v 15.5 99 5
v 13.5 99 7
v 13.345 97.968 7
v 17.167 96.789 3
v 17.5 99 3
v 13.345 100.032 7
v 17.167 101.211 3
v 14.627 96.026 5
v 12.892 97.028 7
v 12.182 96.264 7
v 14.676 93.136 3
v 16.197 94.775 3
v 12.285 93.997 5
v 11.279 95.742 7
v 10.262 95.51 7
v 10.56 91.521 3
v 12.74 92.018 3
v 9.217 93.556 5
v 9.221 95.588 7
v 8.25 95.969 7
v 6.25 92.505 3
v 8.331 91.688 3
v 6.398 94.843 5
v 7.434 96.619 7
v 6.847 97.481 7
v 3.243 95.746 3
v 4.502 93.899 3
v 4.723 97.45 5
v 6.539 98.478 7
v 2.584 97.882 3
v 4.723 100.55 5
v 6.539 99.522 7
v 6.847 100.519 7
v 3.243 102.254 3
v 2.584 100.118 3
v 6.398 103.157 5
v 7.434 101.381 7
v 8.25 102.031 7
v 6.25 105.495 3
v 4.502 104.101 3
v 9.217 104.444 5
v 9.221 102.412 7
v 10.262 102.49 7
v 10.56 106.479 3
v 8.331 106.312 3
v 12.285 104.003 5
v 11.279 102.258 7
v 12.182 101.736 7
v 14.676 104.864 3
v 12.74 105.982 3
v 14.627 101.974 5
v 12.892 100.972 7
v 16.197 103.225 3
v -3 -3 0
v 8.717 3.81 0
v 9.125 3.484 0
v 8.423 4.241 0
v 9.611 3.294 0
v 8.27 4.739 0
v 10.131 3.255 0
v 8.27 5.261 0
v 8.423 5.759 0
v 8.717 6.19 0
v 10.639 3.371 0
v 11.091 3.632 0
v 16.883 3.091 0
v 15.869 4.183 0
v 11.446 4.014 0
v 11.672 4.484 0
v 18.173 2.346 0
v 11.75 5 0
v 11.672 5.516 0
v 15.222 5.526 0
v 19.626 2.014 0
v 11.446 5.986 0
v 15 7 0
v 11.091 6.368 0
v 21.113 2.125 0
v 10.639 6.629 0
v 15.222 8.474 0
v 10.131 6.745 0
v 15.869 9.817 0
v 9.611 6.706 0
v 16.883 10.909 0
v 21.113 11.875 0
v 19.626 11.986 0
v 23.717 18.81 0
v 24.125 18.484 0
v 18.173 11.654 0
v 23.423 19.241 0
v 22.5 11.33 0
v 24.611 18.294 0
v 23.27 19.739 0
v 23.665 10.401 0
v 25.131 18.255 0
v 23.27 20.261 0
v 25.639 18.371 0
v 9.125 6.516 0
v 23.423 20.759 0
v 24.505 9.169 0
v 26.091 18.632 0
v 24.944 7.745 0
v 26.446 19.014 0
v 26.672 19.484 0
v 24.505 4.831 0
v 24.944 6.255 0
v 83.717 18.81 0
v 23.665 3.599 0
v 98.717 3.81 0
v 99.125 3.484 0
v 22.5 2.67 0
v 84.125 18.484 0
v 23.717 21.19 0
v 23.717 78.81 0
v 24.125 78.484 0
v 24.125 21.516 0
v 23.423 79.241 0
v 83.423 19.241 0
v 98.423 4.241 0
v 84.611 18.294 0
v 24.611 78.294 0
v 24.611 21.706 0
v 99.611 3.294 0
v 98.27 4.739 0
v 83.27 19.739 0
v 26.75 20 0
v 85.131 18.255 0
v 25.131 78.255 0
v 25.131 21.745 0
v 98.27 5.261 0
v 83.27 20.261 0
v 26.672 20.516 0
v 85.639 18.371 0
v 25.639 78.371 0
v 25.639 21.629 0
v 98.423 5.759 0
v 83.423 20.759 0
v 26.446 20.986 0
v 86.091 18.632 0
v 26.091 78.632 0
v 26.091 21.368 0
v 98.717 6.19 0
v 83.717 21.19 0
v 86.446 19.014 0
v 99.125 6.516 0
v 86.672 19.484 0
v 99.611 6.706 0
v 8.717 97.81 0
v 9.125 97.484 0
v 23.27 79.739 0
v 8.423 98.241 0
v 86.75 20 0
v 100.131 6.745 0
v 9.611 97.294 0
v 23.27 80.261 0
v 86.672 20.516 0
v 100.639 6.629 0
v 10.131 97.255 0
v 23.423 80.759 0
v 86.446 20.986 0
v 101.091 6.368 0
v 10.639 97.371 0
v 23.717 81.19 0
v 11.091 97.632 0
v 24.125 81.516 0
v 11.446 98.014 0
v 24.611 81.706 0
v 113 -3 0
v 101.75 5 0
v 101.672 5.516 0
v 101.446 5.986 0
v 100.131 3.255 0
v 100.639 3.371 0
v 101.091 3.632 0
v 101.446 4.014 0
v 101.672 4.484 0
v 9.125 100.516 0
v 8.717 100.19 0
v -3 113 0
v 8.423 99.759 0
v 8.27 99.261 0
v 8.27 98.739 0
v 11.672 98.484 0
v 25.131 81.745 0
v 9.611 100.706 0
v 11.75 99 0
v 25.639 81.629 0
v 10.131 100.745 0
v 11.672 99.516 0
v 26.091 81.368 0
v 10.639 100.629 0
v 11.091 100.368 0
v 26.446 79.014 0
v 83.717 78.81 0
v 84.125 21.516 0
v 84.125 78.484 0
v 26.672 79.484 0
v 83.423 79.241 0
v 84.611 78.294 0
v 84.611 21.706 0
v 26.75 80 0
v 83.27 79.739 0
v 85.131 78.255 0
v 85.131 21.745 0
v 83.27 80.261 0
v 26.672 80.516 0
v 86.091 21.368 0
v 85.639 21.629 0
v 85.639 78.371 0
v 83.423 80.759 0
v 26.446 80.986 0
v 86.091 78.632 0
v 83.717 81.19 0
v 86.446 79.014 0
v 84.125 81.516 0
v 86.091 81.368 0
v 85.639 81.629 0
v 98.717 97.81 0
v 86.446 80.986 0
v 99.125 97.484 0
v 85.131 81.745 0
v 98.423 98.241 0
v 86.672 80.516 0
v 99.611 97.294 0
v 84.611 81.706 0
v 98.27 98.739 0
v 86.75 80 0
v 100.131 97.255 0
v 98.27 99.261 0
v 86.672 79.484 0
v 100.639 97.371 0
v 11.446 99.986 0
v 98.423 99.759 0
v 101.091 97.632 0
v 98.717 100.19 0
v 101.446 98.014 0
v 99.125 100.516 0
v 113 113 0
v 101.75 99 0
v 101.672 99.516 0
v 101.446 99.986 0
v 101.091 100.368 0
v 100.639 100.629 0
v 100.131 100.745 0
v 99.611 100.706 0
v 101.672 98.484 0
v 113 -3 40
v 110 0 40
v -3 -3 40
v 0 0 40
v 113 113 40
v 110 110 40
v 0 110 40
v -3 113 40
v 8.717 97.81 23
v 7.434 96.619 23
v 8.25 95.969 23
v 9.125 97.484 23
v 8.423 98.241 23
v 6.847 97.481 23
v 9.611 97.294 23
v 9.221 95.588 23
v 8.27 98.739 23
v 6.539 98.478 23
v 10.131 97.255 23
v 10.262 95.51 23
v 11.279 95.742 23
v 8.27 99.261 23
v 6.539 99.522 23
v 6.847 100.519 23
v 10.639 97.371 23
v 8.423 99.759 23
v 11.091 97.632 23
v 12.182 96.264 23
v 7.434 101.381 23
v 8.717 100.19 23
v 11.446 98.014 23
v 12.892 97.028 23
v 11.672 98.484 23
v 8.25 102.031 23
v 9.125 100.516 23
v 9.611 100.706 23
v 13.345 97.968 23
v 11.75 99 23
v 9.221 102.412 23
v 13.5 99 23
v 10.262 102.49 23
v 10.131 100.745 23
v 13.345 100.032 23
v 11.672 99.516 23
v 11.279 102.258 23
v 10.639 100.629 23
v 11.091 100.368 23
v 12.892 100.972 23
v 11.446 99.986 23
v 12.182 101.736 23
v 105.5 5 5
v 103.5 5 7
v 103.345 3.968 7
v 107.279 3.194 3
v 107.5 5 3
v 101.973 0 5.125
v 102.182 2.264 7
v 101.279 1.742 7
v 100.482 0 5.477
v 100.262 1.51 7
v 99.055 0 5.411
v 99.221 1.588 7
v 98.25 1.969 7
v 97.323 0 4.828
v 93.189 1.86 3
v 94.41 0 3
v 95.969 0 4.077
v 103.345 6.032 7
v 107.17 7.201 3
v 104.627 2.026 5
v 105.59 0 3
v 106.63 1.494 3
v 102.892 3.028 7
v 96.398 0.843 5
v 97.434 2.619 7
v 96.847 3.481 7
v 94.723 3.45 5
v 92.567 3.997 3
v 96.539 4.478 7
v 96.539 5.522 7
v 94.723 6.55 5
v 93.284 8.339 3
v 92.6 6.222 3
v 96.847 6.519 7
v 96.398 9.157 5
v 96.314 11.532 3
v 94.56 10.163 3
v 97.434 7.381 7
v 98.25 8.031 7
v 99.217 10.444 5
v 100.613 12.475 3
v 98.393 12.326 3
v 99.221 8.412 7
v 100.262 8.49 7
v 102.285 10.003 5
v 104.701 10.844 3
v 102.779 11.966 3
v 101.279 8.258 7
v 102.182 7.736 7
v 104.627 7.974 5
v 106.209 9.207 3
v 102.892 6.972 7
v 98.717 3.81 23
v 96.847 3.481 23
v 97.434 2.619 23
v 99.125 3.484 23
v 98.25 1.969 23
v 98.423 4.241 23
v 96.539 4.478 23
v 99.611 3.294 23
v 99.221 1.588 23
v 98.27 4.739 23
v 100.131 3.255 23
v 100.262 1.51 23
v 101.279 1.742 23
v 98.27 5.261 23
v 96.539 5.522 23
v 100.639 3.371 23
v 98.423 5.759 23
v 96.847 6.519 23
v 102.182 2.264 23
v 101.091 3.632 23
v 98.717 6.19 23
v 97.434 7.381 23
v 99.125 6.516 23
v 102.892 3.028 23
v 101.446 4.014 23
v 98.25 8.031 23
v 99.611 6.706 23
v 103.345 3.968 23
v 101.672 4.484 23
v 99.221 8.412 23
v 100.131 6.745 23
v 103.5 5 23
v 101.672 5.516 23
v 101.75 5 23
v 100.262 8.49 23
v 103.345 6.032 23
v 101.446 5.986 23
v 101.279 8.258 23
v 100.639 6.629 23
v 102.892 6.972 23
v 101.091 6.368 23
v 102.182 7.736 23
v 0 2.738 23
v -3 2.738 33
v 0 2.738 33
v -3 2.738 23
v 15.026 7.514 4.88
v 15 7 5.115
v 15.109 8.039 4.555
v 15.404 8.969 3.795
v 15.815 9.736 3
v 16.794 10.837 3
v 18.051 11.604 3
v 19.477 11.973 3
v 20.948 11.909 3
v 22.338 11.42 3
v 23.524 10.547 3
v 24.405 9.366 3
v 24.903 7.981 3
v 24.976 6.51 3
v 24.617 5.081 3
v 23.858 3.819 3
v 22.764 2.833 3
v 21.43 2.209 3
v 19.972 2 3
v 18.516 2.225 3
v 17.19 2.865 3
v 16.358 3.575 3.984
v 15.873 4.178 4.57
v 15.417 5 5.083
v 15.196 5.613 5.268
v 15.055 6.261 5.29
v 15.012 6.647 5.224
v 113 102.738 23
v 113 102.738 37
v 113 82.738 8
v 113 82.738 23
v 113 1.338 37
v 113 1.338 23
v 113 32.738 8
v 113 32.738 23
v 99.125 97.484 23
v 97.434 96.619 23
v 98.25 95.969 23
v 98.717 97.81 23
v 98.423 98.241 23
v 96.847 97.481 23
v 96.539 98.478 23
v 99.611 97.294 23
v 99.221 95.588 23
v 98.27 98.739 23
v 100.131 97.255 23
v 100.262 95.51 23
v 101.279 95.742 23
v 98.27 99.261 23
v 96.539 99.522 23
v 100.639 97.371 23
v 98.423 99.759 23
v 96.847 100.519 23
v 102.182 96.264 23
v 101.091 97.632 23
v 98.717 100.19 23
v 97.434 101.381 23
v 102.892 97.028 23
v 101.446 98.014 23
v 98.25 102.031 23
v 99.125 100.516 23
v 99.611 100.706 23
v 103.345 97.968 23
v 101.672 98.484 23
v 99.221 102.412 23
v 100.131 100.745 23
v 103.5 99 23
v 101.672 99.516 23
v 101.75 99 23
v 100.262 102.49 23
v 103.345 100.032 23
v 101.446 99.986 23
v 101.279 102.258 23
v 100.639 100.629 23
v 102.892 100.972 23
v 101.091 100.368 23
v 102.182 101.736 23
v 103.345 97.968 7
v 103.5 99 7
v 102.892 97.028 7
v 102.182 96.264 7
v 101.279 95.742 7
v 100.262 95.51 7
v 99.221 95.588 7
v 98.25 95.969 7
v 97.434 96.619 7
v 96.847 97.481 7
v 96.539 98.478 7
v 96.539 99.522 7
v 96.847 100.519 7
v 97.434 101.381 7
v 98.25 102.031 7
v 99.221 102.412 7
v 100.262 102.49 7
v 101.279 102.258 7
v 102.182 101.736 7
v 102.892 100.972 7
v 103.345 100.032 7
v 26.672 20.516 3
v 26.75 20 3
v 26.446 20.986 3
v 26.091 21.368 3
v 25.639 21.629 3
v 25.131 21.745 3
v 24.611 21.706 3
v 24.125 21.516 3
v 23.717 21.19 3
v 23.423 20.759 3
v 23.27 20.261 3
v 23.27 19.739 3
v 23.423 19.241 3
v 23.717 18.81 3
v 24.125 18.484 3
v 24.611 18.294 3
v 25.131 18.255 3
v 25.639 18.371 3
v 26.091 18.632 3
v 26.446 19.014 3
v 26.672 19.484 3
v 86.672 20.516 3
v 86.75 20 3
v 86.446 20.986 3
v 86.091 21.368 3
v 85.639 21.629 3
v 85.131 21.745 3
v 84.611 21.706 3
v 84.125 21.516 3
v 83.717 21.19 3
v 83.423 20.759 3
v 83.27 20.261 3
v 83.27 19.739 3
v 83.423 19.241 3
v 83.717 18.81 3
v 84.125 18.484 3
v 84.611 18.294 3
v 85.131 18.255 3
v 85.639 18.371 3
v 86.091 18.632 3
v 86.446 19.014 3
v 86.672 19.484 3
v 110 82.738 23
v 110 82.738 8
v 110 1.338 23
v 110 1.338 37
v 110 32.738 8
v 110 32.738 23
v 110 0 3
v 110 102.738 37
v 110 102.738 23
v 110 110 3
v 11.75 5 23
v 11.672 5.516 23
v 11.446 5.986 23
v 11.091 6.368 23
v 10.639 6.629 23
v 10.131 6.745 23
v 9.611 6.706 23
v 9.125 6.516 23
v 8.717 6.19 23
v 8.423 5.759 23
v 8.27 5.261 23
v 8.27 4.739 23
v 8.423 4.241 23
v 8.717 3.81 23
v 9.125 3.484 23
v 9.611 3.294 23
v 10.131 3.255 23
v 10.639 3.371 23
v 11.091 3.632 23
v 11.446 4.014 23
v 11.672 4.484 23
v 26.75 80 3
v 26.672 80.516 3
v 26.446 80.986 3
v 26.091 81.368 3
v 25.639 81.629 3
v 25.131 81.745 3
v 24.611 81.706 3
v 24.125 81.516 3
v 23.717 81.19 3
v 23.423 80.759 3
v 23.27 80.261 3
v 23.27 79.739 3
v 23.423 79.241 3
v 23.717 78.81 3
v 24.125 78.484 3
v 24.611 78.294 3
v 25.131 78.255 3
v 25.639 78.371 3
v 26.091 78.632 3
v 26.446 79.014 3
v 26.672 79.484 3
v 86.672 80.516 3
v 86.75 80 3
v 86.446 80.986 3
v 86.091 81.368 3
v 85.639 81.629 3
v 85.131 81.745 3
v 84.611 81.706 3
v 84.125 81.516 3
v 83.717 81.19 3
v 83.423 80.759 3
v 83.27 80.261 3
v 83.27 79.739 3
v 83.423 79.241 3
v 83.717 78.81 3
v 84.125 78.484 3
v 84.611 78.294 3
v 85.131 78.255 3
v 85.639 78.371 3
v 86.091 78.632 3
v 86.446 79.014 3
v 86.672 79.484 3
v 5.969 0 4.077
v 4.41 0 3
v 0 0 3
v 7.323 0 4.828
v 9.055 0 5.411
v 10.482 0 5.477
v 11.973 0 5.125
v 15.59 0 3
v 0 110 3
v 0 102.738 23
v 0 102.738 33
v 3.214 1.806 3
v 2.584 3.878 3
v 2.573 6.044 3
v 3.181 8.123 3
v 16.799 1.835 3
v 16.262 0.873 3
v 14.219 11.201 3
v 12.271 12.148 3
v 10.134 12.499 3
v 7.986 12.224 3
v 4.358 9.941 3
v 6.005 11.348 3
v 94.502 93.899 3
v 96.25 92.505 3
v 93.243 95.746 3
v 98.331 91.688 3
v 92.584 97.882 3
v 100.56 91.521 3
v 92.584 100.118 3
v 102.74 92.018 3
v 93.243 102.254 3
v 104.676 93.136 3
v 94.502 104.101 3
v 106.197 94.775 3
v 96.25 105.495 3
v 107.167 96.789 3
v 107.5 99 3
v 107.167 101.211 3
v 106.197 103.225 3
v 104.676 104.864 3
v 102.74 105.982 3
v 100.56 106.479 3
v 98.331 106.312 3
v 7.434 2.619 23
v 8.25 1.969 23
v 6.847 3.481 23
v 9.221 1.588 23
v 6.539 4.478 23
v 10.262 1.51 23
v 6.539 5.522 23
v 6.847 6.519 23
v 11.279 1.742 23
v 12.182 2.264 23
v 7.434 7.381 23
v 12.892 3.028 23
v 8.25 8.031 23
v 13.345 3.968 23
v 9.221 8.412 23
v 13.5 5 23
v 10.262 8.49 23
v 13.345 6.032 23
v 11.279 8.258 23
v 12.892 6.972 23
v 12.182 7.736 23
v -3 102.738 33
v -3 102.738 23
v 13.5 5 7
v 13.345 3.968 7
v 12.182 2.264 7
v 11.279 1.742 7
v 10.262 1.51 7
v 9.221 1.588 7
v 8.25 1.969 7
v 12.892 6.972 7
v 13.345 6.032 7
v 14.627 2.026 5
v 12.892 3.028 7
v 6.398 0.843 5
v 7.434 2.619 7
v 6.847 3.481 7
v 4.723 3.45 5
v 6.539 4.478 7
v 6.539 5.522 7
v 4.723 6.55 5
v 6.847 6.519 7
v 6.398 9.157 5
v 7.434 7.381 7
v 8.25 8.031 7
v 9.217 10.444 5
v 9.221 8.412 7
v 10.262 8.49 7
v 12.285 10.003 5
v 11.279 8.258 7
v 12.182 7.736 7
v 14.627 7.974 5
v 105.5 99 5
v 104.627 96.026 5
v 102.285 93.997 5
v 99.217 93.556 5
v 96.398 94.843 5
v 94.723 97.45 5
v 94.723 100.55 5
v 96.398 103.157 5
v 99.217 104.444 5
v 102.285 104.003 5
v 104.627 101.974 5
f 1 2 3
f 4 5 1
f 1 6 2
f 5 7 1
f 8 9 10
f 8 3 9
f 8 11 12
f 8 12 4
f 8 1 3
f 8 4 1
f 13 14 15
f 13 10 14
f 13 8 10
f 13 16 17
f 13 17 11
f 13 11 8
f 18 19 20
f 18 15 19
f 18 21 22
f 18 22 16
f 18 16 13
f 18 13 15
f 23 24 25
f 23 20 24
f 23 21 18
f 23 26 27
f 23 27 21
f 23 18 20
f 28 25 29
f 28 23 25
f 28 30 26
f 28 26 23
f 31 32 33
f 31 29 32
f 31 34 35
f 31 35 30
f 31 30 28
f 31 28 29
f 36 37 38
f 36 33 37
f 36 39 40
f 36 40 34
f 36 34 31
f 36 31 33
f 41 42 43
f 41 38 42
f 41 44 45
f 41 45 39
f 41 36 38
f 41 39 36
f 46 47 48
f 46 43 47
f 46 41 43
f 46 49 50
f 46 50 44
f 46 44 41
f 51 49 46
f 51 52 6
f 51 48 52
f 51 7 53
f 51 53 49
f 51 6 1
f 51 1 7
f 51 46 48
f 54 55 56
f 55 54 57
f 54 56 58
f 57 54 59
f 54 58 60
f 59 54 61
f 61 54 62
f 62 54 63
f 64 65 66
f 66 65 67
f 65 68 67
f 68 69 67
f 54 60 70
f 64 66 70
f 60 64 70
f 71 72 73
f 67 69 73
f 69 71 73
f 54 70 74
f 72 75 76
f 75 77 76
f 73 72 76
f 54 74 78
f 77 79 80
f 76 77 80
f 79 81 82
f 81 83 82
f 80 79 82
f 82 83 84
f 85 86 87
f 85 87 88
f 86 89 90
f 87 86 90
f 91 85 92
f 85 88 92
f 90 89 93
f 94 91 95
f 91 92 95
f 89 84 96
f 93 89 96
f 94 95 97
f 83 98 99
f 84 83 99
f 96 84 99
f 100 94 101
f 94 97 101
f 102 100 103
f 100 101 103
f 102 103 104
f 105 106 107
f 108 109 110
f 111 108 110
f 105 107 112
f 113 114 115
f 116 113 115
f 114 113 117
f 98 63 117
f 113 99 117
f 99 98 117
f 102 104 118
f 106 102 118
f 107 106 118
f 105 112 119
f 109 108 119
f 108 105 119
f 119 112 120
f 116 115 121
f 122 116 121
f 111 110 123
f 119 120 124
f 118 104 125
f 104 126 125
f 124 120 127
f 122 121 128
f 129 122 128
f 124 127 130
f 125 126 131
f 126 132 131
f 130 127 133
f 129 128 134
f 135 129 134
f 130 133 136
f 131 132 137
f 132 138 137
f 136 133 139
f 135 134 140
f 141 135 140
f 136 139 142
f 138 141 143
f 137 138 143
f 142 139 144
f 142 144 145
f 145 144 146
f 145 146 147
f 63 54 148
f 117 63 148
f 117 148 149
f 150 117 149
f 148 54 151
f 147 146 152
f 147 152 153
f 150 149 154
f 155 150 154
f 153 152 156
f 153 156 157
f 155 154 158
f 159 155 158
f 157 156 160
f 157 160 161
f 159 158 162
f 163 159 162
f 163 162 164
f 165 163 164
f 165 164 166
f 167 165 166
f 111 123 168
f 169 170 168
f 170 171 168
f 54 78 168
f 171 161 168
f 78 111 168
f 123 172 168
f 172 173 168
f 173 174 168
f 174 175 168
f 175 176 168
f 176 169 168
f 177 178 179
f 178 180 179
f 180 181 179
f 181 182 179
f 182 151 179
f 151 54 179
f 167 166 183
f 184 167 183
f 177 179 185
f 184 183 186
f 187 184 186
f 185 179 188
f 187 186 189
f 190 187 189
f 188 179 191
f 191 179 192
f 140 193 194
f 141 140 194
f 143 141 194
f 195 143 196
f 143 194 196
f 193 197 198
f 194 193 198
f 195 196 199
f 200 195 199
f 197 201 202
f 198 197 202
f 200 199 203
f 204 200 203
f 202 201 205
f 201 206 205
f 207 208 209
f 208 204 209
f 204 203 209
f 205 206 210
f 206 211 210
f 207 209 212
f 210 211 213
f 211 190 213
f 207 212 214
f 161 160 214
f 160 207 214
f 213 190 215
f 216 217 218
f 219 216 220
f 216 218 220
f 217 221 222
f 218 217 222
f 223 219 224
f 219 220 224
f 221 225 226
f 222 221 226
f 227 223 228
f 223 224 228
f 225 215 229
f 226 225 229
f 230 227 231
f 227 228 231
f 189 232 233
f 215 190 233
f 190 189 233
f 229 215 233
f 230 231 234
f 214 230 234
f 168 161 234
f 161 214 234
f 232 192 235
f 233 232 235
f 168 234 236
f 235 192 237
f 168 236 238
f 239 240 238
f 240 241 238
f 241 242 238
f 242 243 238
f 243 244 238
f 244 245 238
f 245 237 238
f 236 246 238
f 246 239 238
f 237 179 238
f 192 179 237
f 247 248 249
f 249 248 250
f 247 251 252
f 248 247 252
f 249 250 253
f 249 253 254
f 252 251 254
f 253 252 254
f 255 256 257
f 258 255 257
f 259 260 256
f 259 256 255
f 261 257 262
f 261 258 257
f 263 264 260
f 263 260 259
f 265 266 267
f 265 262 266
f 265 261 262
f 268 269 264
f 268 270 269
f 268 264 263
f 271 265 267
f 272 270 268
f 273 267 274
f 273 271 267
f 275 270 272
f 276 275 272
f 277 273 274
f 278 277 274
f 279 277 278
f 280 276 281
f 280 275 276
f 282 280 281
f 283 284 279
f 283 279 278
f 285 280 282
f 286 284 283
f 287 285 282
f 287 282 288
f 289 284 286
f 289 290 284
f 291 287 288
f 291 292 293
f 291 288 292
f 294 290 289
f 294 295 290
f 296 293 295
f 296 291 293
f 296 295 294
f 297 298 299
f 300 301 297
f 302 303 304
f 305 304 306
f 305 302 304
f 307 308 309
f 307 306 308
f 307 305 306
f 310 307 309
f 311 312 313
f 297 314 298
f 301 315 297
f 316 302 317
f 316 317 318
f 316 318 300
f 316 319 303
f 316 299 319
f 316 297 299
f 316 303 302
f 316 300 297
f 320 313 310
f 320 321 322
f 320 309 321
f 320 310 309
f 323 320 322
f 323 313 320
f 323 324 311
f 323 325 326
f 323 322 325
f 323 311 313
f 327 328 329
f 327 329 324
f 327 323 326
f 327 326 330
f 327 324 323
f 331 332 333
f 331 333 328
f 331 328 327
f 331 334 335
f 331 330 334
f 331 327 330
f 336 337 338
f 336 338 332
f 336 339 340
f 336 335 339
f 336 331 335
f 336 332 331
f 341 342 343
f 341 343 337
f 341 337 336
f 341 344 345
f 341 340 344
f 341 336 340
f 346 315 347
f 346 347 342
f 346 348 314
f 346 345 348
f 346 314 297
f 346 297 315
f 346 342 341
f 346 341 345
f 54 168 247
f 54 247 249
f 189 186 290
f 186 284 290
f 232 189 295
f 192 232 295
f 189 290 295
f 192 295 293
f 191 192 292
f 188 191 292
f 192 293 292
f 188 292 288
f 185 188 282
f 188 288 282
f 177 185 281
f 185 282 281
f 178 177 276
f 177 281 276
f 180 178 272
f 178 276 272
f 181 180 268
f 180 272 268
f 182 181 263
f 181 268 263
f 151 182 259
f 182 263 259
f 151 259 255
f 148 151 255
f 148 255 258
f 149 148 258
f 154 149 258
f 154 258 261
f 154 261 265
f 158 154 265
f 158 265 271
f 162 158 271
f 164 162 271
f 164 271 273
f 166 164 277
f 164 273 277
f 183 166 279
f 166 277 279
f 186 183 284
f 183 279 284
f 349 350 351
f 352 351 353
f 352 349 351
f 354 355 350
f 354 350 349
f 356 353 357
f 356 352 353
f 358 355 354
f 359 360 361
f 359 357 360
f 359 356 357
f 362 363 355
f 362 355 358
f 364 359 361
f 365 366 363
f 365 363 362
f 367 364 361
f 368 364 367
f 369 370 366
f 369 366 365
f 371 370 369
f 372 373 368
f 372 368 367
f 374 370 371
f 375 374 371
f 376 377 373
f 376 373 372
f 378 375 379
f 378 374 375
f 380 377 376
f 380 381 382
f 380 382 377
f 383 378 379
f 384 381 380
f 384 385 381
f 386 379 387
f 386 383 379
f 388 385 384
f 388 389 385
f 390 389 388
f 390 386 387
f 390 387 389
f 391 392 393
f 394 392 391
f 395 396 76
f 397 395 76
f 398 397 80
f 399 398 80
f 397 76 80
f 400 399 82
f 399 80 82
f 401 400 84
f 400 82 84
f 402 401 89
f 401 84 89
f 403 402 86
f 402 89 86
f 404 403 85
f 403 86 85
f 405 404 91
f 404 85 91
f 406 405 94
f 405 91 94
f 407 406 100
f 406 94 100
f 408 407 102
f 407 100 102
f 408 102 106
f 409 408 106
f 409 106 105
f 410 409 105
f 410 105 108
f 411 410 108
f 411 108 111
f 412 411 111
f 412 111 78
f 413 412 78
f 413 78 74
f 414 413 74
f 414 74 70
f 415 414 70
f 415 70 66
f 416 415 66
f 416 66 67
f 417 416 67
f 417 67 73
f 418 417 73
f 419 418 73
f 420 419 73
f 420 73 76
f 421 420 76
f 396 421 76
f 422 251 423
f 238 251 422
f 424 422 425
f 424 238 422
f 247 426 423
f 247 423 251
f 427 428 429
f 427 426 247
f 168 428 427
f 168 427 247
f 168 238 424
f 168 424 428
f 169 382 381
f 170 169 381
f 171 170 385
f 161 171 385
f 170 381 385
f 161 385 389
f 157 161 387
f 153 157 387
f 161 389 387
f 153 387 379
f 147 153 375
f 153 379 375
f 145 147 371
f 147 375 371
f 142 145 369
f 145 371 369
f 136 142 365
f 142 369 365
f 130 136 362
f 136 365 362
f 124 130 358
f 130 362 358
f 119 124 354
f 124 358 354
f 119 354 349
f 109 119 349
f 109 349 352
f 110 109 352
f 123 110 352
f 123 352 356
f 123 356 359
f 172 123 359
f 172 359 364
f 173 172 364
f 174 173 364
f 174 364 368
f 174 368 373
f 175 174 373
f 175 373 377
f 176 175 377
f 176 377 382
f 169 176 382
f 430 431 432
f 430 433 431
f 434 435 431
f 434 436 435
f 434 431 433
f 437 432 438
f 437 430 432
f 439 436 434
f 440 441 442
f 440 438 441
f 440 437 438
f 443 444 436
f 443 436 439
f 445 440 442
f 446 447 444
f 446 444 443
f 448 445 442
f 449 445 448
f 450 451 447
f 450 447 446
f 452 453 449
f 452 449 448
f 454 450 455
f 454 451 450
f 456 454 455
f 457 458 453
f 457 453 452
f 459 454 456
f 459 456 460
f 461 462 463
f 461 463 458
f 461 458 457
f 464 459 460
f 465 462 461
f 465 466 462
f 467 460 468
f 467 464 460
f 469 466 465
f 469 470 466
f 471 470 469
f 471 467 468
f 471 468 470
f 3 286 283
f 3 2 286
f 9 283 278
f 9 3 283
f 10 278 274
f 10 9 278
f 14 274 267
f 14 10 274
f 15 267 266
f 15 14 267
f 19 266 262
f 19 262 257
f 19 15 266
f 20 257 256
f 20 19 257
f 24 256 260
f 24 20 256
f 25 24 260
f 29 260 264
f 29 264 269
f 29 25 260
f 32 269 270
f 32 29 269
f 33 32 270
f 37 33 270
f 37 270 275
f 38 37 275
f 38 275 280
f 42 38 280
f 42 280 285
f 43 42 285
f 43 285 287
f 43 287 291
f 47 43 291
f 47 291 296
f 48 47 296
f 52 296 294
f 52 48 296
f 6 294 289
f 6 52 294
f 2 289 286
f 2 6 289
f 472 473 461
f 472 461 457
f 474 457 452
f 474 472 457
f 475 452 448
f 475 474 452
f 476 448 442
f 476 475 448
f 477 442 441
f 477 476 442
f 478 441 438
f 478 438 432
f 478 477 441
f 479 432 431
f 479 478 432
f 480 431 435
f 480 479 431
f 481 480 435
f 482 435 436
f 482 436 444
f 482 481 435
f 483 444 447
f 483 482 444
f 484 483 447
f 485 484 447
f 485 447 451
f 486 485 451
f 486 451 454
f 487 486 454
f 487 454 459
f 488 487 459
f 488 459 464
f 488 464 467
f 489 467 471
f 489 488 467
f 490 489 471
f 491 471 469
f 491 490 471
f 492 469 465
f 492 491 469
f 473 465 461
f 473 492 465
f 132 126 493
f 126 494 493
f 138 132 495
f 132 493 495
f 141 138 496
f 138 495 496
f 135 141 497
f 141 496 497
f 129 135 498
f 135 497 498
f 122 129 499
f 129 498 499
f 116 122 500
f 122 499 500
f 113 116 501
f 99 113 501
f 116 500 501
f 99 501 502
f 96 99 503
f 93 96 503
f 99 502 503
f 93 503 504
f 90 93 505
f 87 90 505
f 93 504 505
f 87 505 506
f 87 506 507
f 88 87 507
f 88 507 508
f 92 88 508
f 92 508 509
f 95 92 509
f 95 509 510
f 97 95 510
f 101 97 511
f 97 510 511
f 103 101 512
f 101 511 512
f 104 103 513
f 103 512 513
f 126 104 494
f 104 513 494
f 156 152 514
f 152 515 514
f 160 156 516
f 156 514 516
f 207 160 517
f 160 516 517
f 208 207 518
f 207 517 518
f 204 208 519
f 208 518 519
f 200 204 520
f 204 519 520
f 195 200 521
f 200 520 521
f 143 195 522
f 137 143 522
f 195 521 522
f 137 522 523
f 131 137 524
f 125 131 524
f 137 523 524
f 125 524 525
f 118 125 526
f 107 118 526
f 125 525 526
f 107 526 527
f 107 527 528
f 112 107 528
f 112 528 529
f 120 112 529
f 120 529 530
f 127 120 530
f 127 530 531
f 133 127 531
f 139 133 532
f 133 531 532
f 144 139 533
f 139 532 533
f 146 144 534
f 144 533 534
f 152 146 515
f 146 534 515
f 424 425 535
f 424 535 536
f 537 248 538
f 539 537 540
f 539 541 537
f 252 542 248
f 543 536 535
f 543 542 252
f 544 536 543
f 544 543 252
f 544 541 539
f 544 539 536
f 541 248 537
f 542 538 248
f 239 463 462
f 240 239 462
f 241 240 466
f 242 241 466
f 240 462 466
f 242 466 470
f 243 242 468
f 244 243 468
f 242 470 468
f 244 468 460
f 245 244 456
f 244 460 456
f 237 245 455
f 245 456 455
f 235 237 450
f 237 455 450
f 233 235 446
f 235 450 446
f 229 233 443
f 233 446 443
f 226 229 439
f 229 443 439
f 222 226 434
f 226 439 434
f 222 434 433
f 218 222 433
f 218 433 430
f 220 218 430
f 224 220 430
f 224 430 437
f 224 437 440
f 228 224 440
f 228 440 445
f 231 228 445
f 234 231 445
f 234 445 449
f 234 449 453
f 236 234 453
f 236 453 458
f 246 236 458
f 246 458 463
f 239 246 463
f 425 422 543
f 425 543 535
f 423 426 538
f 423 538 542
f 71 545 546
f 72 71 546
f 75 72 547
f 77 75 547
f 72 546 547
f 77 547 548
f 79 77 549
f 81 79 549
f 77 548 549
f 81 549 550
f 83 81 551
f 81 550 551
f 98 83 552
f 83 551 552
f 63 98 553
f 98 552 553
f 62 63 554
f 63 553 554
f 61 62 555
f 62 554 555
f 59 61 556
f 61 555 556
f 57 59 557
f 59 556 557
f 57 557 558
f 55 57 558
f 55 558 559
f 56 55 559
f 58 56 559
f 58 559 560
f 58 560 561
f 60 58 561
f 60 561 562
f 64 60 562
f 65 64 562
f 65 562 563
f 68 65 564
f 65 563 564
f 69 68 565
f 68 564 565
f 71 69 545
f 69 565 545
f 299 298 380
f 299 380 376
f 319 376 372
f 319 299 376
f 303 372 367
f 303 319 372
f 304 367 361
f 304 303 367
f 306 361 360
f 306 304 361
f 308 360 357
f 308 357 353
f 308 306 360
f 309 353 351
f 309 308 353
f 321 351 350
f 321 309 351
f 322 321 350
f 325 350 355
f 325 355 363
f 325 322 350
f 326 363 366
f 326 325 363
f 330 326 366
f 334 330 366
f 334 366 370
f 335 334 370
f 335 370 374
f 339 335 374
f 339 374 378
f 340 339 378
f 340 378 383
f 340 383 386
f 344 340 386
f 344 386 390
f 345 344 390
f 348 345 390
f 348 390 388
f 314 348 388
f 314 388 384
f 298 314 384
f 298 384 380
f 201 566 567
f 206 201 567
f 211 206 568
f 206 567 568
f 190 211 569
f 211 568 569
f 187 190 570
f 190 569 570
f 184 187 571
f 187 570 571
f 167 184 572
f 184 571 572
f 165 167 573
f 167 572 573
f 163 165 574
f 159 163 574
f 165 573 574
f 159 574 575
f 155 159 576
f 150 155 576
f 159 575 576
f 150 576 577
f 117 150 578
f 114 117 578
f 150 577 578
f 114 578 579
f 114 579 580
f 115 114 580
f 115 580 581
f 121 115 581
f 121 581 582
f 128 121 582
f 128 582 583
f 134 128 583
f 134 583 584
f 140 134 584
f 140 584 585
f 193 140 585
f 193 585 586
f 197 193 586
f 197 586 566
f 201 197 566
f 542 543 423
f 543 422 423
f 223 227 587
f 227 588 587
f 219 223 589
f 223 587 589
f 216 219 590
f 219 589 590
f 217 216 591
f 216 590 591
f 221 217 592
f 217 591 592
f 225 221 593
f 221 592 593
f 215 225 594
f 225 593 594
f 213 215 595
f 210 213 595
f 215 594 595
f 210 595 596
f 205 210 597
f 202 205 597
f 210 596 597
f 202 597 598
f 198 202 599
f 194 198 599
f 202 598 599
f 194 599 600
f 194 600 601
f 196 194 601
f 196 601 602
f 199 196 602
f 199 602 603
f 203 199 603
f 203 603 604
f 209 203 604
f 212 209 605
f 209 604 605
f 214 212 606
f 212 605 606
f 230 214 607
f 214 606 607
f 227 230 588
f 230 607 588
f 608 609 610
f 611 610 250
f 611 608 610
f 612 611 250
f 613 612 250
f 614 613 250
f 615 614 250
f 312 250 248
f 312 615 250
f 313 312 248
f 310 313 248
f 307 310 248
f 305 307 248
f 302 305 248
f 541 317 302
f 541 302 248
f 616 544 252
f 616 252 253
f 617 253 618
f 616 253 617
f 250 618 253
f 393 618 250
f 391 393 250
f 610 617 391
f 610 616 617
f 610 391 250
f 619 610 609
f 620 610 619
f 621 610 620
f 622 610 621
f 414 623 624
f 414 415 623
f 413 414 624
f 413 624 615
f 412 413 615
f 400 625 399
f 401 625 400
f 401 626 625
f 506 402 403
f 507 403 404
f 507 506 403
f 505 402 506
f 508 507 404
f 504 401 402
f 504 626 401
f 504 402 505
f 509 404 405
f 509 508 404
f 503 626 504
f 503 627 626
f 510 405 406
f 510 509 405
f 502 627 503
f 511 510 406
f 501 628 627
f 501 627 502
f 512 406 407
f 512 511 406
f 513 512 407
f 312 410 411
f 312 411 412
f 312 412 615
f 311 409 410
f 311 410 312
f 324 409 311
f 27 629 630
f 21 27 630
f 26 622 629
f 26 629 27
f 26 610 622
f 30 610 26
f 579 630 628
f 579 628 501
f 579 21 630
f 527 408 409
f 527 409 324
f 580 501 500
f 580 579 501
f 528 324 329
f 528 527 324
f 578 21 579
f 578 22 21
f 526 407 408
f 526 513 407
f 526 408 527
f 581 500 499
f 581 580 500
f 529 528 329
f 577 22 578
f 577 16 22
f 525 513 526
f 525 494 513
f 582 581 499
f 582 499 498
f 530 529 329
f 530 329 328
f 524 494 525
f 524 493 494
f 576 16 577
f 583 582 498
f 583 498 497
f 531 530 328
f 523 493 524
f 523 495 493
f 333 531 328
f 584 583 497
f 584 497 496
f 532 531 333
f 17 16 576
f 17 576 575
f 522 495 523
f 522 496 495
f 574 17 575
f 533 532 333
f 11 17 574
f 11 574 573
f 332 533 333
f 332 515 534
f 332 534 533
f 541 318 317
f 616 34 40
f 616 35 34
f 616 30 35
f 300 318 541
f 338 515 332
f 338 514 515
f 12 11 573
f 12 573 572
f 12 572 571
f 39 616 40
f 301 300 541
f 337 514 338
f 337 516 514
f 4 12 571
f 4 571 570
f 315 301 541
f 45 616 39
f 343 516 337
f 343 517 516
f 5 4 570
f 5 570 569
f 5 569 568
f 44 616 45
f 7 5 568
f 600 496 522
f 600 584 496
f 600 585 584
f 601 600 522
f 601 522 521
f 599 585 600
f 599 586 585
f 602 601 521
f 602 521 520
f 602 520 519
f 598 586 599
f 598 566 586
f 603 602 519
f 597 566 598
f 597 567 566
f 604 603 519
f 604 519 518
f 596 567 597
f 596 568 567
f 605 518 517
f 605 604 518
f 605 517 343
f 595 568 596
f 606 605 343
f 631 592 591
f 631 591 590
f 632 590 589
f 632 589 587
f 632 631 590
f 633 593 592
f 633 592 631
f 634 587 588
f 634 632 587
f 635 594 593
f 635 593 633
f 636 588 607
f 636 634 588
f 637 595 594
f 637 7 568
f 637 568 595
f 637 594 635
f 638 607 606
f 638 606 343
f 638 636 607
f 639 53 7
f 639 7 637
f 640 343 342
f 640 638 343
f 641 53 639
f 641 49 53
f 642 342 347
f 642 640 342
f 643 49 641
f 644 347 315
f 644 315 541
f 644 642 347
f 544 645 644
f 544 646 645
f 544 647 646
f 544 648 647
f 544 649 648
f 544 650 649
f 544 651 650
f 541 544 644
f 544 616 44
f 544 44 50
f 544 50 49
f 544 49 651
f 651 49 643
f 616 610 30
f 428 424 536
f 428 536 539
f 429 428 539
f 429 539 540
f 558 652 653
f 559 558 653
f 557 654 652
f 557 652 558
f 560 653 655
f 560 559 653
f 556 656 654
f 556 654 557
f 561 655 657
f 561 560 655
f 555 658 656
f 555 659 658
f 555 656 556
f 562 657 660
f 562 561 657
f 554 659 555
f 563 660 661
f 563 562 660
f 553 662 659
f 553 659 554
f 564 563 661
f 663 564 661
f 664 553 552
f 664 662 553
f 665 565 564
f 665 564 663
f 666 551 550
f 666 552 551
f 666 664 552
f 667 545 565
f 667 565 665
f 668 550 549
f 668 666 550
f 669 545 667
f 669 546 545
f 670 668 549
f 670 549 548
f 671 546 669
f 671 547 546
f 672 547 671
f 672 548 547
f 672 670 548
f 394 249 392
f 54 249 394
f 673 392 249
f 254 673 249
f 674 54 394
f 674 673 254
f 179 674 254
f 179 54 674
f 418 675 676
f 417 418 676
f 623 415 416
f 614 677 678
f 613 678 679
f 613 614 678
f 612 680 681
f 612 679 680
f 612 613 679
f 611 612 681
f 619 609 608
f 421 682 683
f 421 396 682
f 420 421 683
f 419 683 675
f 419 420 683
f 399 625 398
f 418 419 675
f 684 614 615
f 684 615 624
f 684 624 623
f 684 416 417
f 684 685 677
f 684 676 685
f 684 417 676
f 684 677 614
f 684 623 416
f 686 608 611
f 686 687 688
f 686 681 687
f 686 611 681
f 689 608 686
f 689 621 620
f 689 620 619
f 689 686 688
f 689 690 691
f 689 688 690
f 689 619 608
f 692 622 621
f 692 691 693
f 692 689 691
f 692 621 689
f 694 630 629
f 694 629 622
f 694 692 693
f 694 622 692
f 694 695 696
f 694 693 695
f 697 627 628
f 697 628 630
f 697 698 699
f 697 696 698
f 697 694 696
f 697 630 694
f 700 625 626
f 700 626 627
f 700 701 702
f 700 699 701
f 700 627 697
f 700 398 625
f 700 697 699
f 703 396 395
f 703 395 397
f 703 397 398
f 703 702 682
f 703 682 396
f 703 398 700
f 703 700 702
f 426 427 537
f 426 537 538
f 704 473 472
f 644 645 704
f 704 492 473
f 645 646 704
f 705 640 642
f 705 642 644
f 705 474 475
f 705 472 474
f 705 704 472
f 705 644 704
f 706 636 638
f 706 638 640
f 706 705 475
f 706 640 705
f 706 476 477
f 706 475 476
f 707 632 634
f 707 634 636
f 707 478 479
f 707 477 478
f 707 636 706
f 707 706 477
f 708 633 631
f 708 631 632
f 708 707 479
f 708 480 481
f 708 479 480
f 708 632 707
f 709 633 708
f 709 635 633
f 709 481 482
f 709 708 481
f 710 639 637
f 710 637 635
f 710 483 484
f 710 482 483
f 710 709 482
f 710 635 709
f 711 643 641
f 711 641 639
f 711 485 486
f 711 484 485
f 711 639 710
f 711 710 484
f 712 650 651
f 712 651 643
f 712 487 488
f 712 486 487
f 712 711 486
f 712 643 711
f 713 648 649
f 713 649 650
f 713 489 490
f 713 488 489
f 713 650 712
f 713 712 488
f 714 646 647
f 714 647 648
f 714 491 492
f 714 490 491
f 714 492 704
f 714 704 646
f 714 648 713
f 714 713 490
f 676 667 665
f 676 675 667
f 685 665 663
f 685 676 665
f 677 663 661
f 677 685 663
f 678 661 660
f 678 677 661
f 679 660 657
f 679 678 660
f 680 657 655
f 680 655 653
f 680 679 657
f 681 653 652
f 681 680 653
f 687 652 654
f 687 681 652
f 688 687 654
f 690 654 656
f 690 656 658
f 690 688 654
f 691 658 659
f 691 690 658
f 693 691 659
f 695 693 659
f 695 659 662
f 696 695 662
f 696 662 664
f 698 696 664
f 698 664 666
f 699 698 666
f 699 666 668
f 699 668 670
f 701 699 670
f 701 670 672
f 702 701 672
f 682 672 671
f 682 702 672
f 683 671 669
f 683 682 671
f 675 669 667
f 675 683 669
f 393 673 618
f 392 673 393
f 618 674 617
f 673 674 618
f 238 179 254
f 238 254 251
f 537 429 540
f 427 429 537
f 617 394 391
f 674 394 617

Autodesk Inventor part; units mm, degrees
ref_plane "YZ Plane" through (0, 0, 0) normal (1, 0, 0) x (0, 1, 0)
ref_plane "XZ Plane" through (0, 0, 0) normal (0, 1, 0) x (-1, 0, 0)
ref_plane "XY Plane" through (0, 0, 0) normal (0, 0, 1) x (1, 0, 0)
sketch "Sketch1" plane through (0, 0, 0) normal (0, 0, 1) x (1, 0, 0)
  line L0 (0, 0) -> (0, 110)
  line L1 (0, 110) -> (110, 110)
  line L2 (110, 110) -> (110, 0)
  line L3 (110, 0) -> (0, 0)
  dimension "d0" = 110
  dimension "d1" = 110
extrude "Extrusion1" add sketch "Sketch1" along normal blind 3
sketch "Sketch2" plane through (0, 0, 0) normal (0, 0, -1) x (-1, 0, 0)
  line L0 (0, 0) -> (3, 0)
  line L1 (3, 0) -> (3, 113)
  line L2 (3, 113) -> (-113, 113)
  line L3 (-113, 113) -> (-113, -3)
  line L4 (-113, -3) -> (3, -3)
  line L5 (3, -3) -> (3, 0)
  line L6 (-110, 110) -> (0, 110)
  line L7 (0, 110) -> (0, 0)
  line L8 (0, 0) -> (-110, 0)
  line L9 (-110, 0) -> (-110, 110)
  dimension "d4" = 3
  dimension "d5" = 113
  dimension "d6" = 116
  dimension "d7" = 116
extrude "Extrusion2" add sketch "Sketch2" against normal blind 40
sketch "Sketch3" plane through (0, 0, 3) normal (0, 0, 1) x (1, 0, 0)
  line L0 (110, 0) -> (0, 0) projected
  line L1 (55, 0) -> (55, 5)
  line L2 (55, 5) -> (10, 5)
  line L3 (55, 5) -> (100, 5)
  line L4 (100, 5) -> (100, 99)
  line L5 (100, 99) -> (10, 99)
  line L6 (10, 99) -> (10, 5)
  circle A0 centre (10, 5) radius 3.5
  circle A1 centre (10, 99) radius 3.5
  circle A2 centre (100, 99) radius 3.5
  circle A3 centre (100, 5) radius 3.5
  dimension "d10" = 5
  dimension "d11" = 45
  dimension "d12" = 45
  dimension "d13" = 94
  dimension "d14" = 90
  dimension "d15" = 7
  dimension "d16" = 7
  dimension "d17" = 7
  dimension "d18" = 7
extrude "Extrusion3" add sketch "Sketch3" along normal blind 20 contours A0 L6 L2 | L2 L6 A0 | A3 L4 L3 | L3 L4 A3 | A1 L5 L6 | L6 L5 A1 | A2 L5 L4 | L4 L5 A2
sketch "Sketch4" plane through (10, 99, 23) normal (0, 0, 1) x (1, 0, 0)
  circle A0 centre (0, 0) radius 1.75
  circle A1 centre (90, 0) radius 3.5 projected
  circle A2 centre (90, 0) radius 1.75
  circle A3 centre (90, -94) radius 3.5 projected
  circle A4 centre (90, -94) radius 1.75
  circle A5 centre (0, -94) radius 3.5 projected
  circle A6 centre (0, -94) radius 1.75
  point P0 (-10, -99)
  point P1 (90, -99)
  point P2 (0, -99)
  dimension "d21" = 3.5
  dimension "d22" = 3.5
  dimension "d23" = 3.5
extrude "Extrusion4" cut sketch "Sketch4" against normal through all contours A0 | A2 | A4 | A6
sketch "Sketch5" plane through (0, 0, 3) normal (0, 0, 1) x (1, 0, 0)
  line L0 (110, 0) -> (0, 0) projected
  line L1 (55, 0) -> (55, 20)
  line L2 (55, 20) -> (85, 20)
  line L3 (85, 20) -> (85, 80)
  line L4 (85, 80) -> (25, 80)
  line L5 (25, 80) -> (25, 20)
  circle A0 centre (25, 20) radius 1.75
  circle A1 centre (25, 80) radius 1.75
  circle A2 centre (85, 80) radius 1.75
  circle A3 centre (85, 20) radius 1.75
  dimension "d26" = 20
  dimension "d27" = 30
  dimension "d28" = 60
  dimension "d29" = 60
  dimension "d30" = 3.5
  dimension "d31" = 3.5
  dimension "d32" = 3.5
  dimension "d33" = 3.5
extrude "Extrusion5" cut sketch "Sketch5" against normal through all
chamfer "Chamfer1" distance 4 angle 45 4 edges at (6.5, 99, 3) (96.5, 99, 3) (6.5, 5, 3) (96.5, 5, 3)
sketch "Sketch6" plane through (113, -3, 0) normal (1, 0, 0) x (0, 0, -1)
  line L0 (-23, 105.5) -> (-23, 98.5) projected
  line L1 (-23, 105.738) -> (-37, 105.738)
  line L2 (-23, 105.738) -> (-9, 105.738) construction
  line L3 (-23, 11.5) -> (-23, 4.5) projected
  line L4 (-23, 4.3379) -> (-37, 4.3379)
  line L5 (-23, 4.3379) -> (-9, 4.3379) construction
  line L6 (-37, 4.3379) -> (-37, 105.738)
  line L7 (-23, 105.738) -> (-23, 85.738)
  line L8 (-23, 85.738) -> (-8, 85.738)
  line L9 (-8, 85.738) -> (-8, 35.738)
  line L10 (-8, 35.738) -> (-23, 35.738)
  line L11 (-23, 35.738) -> (-23, 4.3379)
  point P0 (0, 3)
  dimension "d39" = 14
  dimension "d40" = 180
  dimension "d41" = 14
  dimension "d42" = 180
  dimension "d43" = 20
  dimension "d44" = 15
  dimension "d45" = 50
extrude "Extrusion6" cut sketch "Sketch6" against normal up to surface (3 mm away)
sketch "Sketch7" plane through (-3, -3, 0) normal (-1, 0, 0) x (0, 0, 1)
  line L0 (23, 105.738) -> (33, 105.738)
  line L1 (33, 105.738) -> (33, 5.738)
  line L2 (33, 5.738) -> (23, 5.738)
  line L3 (23, 5.738) -> (23, 105.738)
  point P0 (0, 3)
  dimension "d48" = 10
  dimension "d49" = 100
extrude "Extrusion7" cut sketch "Sketch7" against normal up to surface (3 mm away)
sketch "Sketch8" plane through (0, 0, 0) normal (0, 0, -1) x (-1, 0, 0)
  circle A0 centre (-10, 5) radius 1.75 projected
  line L0 (-10, 5) -> (-20, 5)
  line L1 (-20, 5) -> (-20, 7)
  line L2 (-20, 5) -> (-18, 5) construction
  circle A1 centre (-20, 7) radius 5
  point P0 (0, 0)
  dimension "d52" = 10
  dimension "d53" = 2
  dimension "d54" = 90
  dimension "d55" = 10
extrude "Extrusion8" cut sketch "Sketch8" against normal blind 20 contours A1
equation "\"d15\" = d16"
equation "\"d17\" = d16"
equation "\"d18\" = d16"
properties part number "nuccase"
